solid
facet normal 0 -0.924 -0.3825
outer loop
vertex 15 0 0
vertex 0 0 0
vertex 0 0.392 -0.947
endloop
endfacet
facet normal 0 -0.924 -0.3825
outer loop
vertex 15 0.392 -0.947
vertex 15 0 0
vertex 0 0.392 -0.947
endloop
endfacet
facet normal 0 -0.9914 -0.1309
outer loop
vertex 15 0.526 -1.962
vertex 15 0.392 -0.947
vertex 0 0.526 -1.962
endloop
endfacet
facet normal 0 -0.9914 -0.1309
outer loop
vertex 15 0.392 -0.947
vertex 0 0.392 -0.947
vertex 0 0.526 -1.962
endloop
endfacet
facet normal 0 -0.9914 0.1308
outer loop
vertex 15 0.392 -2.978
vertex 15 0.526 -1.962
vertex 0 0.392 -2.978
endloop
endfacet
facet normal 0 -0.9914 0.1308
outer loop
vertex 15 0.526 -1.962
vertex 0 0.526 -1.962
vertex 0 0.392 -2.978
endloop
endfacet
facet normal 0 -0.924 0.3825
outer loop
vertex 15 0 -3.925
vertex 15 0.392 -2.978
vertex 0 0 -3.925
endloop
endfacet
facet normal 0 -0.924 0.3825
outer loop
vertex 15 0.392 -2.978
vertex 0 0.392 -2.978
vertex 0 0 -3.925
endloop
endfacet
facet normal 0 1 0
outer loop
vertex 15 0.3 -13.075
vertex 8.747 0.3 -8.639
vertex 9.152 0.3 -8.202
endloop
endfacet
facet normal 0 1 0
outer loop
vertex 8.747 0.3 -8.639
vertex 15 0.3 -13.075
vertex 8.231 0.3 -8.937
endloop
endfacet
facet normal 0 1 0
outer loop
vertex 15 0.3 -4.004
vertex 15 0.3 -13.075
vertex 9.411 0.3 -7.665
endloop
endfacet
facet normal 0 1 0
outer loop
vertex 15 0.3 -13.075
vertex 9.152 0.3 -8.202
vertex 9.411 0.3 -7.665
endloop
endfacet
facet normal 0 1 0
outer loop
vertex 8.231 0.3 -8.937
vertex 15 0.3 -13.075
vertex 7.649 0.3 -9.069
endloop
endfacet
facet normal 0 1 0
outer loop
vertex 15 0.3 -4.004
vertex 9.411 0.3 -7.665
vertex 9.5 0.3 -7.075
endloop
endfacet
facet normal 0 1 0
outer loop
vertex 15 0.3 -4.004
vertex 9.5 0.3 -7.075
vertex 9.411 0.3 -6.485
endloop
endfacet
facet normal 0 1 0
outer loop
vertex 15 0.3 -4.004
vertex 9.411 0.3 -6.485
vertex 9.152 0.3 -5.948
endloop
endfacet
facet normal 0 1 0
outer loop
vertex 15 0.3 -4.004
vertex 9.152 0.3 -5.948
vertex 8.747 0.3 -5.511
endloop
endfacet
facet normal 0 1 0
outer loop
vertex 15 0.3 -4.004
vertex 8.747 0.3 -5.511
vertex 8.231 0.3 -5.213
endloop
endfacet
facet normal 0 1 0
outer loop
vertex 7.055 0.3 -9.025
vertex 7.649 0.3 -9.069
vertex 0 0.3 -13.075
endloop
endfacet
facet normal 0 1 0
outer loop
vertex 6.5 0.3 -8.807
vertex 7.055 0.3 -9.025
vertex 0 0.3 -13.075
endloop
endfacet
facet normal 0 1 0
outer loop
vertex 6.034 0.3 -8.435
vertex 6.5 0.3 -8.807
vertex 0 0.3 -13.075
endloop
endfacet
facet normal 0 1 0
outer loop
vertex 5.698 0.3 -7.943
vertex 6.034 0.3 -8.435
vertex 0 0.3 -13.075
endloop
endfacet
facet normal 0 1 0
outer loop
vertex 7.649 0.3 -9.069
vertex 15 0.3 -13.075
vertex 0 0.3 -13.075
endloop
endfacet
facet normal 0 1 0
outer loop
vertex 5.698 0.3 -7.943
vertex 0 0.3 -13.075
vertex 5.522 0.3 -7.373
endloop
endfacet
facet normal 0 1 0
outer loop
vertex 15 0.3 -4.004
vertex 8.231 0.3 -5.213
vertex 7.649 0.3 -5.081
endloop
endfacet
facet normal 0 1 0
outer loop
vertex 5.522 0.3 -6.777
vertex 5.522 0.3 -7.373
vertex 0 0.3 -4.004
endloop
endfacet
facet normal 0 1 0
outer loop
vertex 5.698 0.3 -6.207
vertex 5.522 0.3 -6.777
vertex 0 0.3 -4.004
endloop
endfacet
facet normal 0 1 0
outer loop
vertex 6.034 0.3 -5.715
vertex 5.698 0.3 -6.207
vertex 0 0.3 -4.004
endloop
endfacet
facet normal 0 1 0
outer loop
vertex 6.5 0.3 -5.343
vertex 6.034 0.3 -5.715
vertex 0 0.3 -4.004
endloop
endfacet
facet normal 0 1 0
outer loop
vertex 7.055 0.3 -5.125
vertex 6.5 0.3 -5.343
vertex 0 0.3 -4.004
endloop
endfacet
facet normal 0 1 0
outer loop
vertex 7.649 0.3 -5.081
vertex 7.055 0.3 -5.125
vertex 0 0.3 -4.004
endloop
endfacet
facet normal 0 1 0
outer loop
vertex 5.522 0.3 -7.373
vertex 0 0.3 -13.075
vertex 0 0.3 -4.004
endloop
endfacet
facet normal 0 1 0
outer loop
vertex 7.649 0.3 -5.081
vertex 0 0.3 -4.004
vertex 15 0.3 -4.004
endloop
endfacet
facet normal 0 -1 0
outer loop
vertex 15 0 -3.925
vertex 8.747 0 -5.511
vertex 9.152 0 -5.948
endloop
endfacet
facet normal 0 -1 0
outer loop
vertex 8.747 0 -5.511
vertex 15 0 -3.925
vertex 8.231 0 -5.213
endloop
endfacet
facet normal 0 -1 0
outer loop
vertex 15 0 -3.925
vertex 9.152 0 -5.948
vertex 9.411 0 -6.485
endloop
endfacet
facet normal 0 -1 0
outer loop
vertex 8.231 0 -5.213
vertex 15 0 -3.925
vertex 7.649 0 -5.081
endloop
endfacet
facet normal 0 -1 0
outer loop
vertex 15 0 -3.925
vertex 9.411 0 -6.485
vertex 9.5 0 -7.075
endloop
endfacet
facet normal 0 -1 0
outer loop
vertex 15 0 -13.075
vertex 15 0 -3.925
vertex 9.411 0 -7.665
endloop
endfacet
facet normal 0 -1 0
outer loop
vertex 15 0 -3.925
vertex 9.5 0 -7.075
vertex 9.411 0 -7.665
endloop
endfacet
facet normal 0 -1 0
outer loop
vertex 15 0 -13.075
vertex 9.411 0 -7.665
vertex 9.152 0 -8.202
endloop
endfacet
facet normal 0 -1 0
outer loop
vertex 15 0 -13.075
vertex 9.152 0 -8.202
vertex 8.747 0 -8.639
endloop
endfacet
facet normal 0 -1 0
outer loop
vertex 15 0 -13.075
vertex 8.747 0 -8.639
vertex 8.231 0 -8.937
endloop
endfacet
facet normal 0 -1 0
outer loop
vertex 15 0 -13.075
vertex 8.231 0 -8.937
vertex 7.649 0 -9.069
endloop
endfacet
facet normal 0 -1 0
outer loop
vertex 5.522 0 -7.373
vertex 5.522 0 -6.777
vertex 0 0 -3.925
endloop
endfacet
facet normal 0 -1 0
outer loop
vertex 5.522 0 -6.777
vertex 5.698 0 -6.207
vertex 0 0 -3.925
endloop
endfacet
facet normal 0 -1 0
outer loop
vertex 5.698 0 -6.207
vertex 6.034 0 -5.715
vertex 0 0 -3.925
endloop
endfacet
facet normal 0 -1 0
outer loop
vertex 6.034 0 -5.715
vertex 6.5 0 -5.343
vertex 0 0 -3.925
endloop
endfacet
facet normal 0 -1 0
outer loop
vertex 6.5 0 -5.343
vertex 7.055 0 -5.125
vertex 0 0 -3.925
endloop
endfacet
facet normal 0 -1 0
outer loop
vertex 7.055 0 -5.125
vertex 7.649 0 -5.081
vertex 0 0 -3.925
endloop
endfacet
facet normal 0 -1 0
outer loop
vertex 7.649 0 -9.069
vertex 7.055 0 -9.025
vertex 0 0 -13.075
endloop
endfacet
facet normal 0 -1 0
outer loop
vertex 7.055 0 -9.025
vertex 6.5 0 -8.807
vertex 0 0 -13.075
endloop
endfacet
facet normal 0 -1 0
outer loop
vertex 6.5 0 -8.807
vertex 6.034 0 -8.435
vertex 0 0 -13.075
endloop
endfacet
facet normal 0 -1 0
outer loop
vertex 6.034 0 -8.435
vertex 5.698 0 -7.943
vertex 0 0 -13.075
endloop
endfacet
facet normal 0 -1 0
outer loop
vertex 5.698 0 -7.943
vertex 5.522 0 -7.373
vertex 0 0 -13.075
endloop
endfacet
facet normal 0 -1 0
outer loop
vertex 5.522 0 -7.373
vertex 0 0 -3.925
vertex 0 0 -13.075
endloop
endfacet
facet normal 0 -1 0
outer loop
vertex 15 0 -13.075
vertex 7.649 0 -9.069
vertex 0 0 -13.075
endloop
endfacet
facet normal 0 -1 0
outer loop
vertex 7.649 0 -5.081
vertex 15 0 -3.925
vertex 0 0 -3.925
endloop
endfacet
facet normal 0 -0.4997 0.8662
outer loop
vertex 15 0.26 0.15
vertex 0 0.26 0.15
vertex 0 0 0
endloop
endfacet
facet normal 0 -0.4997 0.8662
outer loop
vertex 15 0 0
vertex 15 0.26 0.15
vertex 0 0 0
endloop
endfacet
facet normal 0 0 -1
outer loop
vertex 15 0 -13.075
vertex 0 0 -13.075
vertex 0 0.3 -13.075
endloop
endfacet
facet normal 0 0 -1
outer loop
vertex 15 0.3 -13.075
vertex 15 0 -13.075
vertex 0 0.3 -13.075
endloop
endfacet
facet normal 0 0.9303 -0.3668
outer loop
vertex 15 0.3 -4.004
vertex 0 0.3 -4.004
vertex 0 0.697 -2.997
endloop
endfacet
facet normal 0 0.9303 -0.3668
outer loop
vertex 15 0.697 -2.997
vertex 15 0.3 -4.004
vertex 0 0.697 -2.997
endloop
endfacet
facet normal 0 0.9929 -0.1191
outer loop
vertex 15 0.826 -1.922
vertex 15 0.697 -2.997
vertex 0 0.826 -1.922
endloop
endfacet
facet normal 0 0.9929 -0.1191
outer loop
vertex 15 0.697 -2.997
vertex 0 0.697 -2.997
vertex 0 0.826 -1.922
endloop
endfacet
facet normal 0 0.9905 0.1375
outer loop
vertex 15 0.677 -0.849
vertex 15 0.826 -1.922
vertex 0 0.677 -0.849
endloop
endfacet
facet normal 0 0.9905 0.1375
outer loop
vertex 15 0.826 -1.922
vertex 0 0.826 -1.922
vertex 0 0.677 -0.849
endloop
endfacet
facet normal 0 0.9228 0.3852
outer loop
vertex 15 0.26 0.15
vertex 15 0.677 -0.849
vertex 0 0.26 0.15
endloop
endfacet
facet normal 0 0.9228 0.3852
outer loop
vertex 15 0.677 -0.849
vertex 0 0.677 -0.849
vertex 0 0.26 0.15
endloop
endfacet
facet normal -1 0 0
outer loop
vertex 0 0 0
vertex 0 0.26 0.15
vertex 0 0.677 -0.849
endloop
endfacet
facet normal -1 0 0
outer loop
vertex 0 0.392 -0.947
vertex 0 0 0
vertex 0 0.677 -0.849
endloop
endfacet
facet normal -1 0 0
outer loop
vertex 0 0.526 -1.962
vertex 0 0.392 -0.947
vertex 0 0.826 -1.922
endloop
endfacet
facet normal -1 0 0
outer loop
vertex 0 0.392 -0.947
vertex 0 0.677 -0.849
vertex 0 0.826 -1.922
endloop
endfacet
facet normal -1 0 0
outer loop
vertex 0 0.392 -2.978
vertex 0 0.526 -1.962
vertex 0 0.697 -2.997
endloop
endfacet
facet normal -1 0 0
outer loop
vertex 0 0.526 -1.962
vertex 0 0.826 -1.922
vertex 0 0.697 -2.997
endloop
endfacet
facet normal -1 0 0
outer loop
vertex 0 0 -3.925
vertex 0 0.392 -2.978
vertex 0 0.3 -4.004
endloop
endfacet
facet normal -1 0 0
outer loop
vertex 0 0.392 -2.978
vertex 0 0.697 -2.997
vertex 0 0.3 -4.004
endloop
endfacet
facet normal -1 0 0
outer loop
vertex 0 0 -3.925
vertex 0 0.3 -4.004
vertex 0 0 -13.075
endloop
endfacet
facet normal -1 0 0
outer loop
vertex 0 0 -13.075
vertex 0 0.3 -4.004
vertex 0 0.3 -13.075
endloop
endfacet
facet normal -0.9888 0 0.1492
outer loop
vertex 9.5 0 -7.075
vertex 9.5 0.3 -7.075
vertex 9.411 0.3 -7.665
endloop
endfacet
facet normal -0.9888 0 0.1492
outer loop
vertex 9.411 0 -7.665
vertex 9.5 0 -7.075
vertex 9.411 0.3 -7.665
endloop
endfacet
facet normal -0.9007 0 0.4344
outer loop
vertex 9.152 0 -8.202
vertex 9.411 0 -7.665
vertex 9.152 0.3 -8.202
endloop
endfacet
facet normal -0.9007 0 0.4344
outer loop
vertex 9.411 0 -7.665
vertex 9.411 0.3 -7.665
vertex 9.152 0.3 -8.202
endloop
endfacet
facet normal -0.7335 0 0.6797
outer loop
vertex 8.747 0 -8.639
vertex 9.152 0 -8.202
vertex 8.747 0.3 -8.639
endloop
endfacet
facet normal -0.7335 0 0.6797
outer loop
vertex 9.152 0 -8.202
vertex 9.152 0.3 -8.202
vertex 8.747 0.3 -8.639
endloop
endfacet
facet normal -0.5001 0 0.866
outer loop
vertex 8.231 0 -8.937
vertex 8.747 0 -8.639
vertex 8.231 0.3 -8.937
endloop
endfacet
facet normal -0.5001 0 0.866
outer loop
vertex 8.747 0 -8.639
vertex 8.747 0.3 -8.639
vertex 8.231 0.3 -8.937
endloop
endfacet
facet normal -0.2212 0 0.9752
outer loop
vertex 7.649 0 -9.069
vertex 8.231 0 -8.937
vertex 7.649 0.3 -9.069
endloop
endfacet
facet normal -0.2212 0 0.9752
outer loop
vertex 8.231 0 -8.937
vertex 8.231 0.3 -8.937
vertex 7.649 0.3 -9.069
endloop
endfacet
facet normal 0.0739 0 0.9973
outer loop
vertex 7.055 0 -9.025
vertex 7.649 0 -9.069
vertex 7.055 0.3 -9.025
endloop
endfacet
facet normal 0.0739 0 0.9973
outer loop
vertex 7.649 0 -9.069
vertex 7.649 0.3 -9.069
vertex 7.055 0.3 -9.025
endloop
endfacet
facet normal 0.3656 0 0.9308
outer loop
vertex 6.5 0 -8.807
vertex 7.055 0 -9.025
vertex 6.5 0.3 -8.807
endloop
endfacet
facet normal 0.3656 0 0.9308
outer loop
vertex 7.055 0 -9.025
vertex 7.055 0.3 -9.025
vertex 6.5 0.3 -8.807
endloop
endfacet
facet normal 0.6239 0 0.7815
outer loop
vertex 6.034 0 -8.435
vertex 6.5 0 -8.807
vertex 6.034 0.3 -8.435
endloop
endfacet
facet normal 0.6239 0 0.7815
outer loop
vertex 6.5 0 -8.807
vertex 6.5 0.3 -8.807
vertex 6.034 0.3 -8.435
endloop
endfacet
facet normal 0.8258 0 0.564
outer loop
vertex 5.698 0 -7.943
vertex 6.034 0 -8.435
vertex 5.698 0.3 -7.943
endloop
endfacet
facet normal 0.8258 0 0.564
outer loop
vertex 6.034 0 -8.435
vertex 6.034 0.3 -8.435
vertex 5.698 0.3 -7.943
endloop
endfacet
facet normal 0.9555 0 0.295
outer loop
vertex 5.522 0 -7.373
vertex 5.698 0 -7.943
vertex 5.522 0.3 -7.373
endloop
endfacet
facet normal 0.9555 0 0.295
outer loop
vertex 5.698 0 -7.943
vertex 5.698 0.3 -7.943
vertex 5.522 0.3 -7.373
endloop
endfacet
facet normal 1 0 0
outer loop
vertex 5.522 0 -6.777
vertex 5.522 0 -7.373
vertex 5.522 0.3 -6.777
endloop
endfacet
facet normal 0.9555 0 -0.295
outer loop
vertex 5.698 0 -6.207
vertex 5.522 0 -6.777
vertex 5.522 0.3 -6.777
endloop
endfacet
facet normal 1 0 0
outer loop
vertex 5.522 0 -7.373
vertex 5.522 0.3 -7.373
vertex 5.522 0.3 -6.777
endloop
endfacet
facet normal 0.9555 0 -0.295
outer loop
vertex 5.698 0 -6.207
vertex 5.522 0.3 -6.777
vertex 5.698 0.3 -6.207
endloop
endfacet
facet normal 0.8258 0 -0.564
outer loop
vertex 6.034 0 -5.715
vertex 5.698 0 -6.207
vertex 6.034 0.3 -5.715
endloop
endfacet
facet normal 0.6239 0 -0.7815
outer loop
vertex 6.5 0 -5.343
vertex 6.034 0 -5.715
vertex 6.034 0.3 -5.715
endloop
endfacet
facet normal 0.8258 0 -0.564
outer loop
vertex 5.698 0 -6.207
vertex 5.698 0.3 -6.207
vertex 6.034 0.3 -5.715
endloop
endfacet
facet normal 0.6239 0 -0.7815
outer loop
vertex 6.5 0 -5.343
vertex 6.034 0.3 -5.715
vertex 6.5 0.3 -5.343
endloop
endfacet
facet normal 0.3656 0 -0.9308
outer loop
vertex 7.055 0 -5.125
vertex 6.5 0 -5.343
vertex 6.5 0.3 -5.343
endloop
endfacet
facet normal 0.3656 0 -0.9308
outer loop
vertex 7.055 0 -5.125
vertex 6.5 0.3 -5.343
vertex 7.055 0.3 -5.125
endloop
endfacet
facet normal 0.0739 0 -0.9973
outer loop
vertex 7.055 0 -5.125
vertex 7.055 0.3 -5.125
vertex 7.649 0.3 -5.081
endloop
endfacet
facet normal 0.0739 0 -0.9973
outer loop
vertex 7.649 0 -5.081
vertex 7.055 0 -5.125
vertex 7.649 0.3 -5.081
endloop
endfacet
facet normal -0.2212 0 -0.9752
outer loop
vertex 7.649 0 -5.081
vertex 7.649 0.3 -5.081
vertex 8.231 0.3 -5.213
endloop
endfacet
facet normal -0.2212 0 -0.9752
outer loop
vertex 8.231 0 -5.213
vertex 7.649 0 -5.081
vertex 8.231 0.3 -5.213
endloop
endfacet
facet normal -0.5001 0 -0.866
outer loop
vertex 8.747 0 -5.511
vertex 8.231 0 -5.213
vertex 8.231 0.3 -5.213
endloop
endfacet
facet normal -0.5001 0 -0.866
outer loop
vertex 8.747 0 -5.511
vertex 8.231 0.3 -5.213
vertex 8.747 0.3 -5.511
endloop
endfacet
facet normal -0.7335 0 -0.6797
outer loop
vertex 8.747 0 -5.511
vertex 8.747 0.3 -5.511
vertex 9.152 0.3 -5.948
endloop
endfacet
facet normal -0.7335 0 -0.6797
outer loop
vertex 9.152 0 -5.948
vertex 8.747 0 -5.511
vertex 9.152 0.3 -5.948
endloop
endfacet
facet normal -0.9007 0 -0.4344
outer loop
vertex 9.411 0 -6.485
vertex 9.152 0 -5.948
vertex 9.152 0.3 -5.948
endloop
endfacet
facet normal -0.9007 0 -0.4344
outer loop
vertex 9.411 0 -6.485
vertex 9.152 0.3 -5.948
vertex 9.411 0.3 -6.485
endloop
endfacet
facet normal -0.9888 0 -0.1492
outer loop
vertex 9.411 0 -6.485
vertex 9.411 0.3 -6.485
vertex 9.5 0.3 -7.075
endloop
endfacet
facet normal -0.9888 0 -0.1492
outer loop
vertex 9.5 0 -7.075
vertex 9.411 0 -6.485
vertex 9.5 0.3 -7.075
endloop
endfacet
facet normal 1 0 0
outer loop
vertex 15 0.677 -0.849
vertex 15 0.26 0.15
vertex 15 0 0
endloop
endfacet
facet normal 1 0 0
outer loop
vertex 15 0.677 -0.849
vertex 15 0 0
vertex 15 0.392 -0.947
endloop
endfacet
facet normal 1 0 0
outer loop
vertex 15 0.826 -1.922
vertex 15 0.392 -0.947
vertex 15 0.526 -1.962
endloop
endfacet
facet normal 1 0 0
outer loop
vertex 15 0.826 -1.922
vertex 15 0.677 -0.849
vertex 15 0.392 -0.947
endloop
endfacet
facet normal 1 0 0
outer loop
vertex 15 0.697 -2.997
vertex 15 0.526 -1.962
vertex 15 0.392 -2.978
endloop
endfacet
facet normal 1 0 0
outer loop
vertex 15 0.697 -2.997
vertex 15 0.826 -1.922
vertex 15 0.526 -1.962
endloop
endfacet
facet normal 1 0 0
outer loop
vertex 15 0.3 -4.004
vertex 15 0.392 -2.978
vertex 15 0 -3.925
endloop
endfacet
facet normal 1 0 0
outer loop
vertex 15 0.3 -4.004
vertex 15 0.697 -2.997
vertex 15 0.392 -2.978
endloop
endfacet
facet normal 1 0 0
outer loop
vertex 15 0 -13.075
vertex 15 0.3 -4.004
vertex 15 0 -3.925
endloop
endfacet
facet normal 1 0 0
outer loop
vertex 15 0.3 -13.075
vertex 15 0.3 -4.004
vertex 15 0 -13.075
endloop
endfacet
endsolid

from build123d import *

# Parameters (mm, degrees)
BOSS_EXTRUDE1_DEPTH = 15
SKETCH4_R           = 2
CUT_EXTRUDE1_DEPTH  = 1.3


with BuildPart() as part:
    # Sketch3 → Boss-Extrude1 (new body)
    with BuildSketch(Plane(origin=(0, 0, 0), x_dir=(0, 0, -1), z_dir=(1, 0, 0))):
        with BuildLine():
            Line((3.925, 0), (13.075, 0))
            Line((13.075, 0), (13.075, 0.3))
            Line((13.075, 0.3), (4.003802629, 0.3))
            ThreePointArc((4.003802629, 0.3), (1.921620626, 0.825652519), (-0.15, 0.259807621))
            Line((-0.15, 0.259807621), (0, 0))
            ThreePointArc((0, 0), (1.9625, 0.52585029), (3.925, 0))
        make_face()
    extrude(amount=BOSS_EXTRUDE1_DEPTH)

    # Sketch4 → Cut-Extrude1 (cut, through all)
    with BuildSketch(Plane(origin=(0, 0.3, 0), x_dir=(1, 0, 0), z_dir=(0, 1, 0))):
        with Locations((7.5, 7.075)):
            Circle(SKETCH4_R)
    extrude(amount=-CUT_EXTRUDE1_DEPTH, mode=Mode.SUBTRACT)


solid = part.part
